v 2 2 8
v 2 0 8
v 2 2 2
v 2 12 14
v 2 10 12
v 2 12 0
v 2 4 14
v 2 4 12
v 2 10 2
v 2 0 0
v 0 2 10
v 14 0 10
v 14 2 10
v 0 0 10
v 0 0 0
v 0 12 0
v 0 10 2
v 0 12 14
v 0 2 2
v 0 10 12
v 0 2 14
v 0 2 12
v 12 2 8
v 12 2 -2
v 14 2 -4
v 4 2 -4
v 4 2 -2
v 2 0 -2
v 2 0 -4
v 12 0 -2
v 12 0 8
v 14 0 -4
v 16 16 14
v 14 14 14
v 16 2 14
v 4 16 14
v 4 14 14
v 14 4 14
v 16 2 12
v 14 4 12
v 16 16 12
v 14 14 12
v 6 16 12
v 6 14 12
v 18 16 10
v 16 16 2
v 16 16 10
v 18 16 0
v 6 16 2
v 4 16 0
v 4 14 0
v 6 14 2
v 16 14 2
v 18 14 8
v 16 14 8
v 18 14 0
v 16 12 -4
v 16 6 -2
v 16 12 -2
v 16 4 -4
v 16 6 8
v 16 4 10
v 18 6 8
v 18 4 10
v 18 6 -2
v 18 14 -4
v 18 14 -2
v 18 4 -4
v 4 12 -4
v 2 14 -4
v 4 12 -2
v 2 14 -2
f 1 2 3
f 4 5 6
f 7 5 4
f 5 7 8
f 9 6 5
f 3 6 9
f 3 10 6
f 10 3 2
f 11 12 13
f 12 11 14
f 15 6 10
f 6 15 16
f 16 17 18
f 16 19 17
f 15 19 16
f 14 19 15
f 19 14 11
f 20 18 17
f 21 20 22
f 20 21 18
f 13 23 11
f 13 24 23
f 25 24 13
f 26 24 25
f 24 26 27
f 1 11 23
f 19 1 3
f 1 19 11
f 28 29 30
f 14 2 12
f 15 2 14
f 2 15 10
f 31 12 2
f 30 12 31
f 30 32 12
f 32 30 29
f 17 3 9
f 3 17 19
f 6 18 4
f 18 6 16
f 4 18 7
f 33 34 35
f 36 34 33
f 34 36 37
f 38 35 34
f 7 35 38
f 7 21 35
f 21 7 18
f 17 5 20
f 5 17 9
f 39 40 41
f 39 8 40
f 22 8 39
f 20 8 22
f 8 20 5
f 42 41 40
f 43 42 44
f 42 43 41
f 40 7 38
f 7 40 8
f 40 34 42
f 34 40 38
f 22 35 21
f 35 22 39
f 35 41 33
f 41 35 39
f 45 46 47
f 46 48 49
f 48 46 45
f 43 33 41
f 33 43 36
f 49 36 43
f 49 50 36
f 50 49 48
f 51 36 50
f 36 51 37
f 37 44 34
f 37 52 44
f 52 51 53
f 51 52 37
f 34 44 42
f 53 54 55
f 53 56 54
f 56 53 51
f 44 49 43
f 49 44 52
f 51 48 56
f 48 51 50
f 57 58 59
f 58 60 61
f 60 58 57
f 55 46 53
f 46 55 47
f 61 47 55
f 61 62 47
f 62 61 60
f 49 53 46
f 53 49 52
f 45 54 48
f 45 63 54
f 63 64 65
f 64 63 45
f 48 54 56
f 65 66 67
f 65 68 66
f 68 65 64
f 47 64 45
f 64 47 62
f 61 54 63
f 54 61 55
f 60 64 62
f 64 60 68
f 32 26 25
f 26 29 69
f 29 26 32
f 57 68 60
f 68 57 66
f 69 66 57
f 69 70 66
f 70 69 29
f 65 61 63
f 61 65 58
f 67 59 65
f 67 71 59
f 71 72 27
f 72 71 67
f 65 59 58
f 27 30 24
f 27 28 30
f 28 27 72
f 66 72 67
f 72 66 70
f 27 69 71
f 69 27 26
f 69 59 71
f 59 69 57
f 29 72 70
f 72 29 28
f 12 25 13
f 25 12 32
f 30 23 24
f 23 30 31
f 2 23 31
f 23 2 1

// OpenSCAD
// [FL_INDEX: keywords="openscad, 3d_parametric, 3d_Cube_Perspective_Illusion, csg_solid" | COT="Parametric OpenSCAD design from 3DCodeverse"]
// Title: 3d Cube Perspective Illusion

cube([2,2,10]);
translate([0,0,10]);
cube([2,12,2]);
translate([0,10,0]) cube([2,2,14]);
translate([0,4,12]) cube([2,8,2]);
translate([0,2,12]) cube([14,2,2]);
translate([14,2,12]) cube([2,14,2]);
translate([4,14,12]) cube([12,2,2]);
translate([4,14,0]) cube([2,2,14]);
translate([4,14,0]) cube([12,2,2]);
translate([16,14,0]) cube([2,2,10]);
translate([16,4,8]) cube([2,12,2]);
translate([16,4,-4]) cube([2,2,12]);
translate([16,4,-4]) cube([2,10,2]);
translate([4,12,-4]) cube([12,2,2]);
translate([2,0,-4]) cube([2,14,2]);
translate([2,0,-4]) cube([12,2,2]);
translate([12,0,-4]) cube([2,2,14]);
translate([0,0,8]) cube([12,2,2]);
